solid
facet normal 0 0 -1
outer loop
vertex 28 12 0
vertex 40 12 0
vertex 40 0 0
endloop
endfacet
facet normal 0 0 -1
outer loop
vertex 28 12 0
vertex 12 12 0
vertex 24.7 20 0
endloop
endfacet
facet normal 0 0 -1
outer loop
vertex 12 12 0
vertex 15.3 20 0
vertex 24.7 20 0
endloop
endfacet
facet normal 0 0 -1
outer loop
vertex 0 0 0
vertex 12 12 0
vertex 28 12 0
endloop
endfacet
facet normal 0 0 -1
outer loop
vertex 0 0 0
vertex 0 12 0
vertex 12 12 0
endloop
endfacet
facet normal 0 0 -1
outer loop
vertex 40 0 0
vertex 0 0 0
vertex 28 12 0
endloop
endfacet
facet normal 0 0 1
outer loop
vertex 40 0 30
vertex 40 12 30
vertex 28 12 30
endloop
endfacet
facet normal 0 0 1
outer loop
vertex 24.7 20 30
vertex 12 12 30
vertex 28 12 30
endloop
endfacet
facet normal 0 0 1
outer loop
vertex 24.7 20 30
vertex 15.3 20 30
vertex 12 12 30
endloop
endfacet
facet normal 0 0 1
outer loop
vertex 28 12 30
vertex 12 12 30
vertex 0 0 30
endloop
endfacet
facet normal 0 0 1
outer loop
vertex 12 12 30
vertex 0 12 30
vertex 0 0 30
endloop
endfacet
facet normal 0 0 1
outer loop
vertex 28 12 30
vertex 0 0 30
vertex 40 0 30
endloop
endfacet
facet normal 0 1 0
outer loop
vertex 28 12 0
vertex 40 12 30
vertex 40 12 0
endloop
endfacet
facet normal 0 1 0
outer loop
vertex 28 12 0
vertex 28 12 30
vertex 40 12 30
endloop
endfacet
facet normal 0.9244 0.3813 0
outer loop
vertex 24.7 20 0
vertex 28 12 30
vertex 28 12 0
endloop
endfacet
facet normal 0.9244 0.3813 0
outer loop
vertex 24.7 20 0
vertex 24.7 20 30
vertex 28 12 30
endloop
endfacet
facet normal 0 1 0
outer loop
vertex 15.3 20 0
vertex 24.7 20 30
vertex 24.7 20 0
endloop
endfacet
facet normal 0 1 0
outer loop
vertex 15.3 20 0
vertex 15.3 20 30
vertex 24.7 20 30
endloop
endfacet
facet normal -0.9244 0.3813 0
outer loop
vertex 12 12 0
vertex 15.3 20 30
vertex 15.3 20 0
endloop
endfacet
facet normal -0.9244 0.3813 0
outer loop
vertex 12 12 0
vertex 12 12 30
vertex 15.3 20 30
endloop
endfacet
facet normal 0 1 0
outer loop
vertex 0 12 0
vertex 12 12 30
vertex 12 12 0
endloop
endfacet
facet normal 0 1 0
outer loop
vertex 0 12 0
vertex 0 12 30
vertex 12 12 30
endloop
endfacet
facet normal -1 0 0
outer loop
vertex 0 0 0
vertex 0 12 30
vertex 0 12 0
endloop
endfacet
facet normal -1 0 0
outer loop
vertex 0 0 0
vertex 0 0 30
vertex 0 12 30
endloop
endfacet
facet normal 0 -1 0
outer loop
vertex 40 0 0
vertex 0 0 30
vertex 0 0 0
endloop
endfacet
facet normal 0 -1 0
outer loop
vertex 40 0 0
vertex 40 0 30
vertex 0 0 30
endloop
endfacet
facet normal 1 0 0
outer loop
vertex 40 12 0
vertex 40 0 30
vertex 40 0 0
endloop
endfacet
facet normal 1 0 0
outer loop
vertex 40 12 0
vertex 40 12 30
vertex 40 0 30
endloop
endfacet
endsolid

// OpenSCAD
$fn = 32;

// ----------------------------------------------------------------------
// V guide rail: dovetail, 40 mm wide
// ----------------------------------------------------------------------

// --- parameters (mm) ---
rail_w = 40;              // rail width, X
base_t = 12;              // base plate thickness
v_depth = 8;              // V feature depth / height
v_half_w = 8;             // half width of the V at the base face
plate_t = 30;             // rail length, Z (the extrusion height)
top_half_w = 4.7;         // half width at the dovetail top
fit_tol = 0.1;            // declared fit tolerance (prompt contract)
free_tol = 0.3;           // declared free tolerance (prompt contract)

dovetail_base = 2 * v_half_w;  // dovetail width at the base
dovetail_top = 2 * top_half_w;  // dovetail width at the top

profile = [[0, 0], [40, 0], [40, 12], [28, 12], [24.7, 20], [15.3, 20], [12, 12], [0, 12]];  // primary outline, 8 points, counter clockwise

// --- the one profile operation ---
linear_extrude(height = plate_t) polygon(points = profile);
